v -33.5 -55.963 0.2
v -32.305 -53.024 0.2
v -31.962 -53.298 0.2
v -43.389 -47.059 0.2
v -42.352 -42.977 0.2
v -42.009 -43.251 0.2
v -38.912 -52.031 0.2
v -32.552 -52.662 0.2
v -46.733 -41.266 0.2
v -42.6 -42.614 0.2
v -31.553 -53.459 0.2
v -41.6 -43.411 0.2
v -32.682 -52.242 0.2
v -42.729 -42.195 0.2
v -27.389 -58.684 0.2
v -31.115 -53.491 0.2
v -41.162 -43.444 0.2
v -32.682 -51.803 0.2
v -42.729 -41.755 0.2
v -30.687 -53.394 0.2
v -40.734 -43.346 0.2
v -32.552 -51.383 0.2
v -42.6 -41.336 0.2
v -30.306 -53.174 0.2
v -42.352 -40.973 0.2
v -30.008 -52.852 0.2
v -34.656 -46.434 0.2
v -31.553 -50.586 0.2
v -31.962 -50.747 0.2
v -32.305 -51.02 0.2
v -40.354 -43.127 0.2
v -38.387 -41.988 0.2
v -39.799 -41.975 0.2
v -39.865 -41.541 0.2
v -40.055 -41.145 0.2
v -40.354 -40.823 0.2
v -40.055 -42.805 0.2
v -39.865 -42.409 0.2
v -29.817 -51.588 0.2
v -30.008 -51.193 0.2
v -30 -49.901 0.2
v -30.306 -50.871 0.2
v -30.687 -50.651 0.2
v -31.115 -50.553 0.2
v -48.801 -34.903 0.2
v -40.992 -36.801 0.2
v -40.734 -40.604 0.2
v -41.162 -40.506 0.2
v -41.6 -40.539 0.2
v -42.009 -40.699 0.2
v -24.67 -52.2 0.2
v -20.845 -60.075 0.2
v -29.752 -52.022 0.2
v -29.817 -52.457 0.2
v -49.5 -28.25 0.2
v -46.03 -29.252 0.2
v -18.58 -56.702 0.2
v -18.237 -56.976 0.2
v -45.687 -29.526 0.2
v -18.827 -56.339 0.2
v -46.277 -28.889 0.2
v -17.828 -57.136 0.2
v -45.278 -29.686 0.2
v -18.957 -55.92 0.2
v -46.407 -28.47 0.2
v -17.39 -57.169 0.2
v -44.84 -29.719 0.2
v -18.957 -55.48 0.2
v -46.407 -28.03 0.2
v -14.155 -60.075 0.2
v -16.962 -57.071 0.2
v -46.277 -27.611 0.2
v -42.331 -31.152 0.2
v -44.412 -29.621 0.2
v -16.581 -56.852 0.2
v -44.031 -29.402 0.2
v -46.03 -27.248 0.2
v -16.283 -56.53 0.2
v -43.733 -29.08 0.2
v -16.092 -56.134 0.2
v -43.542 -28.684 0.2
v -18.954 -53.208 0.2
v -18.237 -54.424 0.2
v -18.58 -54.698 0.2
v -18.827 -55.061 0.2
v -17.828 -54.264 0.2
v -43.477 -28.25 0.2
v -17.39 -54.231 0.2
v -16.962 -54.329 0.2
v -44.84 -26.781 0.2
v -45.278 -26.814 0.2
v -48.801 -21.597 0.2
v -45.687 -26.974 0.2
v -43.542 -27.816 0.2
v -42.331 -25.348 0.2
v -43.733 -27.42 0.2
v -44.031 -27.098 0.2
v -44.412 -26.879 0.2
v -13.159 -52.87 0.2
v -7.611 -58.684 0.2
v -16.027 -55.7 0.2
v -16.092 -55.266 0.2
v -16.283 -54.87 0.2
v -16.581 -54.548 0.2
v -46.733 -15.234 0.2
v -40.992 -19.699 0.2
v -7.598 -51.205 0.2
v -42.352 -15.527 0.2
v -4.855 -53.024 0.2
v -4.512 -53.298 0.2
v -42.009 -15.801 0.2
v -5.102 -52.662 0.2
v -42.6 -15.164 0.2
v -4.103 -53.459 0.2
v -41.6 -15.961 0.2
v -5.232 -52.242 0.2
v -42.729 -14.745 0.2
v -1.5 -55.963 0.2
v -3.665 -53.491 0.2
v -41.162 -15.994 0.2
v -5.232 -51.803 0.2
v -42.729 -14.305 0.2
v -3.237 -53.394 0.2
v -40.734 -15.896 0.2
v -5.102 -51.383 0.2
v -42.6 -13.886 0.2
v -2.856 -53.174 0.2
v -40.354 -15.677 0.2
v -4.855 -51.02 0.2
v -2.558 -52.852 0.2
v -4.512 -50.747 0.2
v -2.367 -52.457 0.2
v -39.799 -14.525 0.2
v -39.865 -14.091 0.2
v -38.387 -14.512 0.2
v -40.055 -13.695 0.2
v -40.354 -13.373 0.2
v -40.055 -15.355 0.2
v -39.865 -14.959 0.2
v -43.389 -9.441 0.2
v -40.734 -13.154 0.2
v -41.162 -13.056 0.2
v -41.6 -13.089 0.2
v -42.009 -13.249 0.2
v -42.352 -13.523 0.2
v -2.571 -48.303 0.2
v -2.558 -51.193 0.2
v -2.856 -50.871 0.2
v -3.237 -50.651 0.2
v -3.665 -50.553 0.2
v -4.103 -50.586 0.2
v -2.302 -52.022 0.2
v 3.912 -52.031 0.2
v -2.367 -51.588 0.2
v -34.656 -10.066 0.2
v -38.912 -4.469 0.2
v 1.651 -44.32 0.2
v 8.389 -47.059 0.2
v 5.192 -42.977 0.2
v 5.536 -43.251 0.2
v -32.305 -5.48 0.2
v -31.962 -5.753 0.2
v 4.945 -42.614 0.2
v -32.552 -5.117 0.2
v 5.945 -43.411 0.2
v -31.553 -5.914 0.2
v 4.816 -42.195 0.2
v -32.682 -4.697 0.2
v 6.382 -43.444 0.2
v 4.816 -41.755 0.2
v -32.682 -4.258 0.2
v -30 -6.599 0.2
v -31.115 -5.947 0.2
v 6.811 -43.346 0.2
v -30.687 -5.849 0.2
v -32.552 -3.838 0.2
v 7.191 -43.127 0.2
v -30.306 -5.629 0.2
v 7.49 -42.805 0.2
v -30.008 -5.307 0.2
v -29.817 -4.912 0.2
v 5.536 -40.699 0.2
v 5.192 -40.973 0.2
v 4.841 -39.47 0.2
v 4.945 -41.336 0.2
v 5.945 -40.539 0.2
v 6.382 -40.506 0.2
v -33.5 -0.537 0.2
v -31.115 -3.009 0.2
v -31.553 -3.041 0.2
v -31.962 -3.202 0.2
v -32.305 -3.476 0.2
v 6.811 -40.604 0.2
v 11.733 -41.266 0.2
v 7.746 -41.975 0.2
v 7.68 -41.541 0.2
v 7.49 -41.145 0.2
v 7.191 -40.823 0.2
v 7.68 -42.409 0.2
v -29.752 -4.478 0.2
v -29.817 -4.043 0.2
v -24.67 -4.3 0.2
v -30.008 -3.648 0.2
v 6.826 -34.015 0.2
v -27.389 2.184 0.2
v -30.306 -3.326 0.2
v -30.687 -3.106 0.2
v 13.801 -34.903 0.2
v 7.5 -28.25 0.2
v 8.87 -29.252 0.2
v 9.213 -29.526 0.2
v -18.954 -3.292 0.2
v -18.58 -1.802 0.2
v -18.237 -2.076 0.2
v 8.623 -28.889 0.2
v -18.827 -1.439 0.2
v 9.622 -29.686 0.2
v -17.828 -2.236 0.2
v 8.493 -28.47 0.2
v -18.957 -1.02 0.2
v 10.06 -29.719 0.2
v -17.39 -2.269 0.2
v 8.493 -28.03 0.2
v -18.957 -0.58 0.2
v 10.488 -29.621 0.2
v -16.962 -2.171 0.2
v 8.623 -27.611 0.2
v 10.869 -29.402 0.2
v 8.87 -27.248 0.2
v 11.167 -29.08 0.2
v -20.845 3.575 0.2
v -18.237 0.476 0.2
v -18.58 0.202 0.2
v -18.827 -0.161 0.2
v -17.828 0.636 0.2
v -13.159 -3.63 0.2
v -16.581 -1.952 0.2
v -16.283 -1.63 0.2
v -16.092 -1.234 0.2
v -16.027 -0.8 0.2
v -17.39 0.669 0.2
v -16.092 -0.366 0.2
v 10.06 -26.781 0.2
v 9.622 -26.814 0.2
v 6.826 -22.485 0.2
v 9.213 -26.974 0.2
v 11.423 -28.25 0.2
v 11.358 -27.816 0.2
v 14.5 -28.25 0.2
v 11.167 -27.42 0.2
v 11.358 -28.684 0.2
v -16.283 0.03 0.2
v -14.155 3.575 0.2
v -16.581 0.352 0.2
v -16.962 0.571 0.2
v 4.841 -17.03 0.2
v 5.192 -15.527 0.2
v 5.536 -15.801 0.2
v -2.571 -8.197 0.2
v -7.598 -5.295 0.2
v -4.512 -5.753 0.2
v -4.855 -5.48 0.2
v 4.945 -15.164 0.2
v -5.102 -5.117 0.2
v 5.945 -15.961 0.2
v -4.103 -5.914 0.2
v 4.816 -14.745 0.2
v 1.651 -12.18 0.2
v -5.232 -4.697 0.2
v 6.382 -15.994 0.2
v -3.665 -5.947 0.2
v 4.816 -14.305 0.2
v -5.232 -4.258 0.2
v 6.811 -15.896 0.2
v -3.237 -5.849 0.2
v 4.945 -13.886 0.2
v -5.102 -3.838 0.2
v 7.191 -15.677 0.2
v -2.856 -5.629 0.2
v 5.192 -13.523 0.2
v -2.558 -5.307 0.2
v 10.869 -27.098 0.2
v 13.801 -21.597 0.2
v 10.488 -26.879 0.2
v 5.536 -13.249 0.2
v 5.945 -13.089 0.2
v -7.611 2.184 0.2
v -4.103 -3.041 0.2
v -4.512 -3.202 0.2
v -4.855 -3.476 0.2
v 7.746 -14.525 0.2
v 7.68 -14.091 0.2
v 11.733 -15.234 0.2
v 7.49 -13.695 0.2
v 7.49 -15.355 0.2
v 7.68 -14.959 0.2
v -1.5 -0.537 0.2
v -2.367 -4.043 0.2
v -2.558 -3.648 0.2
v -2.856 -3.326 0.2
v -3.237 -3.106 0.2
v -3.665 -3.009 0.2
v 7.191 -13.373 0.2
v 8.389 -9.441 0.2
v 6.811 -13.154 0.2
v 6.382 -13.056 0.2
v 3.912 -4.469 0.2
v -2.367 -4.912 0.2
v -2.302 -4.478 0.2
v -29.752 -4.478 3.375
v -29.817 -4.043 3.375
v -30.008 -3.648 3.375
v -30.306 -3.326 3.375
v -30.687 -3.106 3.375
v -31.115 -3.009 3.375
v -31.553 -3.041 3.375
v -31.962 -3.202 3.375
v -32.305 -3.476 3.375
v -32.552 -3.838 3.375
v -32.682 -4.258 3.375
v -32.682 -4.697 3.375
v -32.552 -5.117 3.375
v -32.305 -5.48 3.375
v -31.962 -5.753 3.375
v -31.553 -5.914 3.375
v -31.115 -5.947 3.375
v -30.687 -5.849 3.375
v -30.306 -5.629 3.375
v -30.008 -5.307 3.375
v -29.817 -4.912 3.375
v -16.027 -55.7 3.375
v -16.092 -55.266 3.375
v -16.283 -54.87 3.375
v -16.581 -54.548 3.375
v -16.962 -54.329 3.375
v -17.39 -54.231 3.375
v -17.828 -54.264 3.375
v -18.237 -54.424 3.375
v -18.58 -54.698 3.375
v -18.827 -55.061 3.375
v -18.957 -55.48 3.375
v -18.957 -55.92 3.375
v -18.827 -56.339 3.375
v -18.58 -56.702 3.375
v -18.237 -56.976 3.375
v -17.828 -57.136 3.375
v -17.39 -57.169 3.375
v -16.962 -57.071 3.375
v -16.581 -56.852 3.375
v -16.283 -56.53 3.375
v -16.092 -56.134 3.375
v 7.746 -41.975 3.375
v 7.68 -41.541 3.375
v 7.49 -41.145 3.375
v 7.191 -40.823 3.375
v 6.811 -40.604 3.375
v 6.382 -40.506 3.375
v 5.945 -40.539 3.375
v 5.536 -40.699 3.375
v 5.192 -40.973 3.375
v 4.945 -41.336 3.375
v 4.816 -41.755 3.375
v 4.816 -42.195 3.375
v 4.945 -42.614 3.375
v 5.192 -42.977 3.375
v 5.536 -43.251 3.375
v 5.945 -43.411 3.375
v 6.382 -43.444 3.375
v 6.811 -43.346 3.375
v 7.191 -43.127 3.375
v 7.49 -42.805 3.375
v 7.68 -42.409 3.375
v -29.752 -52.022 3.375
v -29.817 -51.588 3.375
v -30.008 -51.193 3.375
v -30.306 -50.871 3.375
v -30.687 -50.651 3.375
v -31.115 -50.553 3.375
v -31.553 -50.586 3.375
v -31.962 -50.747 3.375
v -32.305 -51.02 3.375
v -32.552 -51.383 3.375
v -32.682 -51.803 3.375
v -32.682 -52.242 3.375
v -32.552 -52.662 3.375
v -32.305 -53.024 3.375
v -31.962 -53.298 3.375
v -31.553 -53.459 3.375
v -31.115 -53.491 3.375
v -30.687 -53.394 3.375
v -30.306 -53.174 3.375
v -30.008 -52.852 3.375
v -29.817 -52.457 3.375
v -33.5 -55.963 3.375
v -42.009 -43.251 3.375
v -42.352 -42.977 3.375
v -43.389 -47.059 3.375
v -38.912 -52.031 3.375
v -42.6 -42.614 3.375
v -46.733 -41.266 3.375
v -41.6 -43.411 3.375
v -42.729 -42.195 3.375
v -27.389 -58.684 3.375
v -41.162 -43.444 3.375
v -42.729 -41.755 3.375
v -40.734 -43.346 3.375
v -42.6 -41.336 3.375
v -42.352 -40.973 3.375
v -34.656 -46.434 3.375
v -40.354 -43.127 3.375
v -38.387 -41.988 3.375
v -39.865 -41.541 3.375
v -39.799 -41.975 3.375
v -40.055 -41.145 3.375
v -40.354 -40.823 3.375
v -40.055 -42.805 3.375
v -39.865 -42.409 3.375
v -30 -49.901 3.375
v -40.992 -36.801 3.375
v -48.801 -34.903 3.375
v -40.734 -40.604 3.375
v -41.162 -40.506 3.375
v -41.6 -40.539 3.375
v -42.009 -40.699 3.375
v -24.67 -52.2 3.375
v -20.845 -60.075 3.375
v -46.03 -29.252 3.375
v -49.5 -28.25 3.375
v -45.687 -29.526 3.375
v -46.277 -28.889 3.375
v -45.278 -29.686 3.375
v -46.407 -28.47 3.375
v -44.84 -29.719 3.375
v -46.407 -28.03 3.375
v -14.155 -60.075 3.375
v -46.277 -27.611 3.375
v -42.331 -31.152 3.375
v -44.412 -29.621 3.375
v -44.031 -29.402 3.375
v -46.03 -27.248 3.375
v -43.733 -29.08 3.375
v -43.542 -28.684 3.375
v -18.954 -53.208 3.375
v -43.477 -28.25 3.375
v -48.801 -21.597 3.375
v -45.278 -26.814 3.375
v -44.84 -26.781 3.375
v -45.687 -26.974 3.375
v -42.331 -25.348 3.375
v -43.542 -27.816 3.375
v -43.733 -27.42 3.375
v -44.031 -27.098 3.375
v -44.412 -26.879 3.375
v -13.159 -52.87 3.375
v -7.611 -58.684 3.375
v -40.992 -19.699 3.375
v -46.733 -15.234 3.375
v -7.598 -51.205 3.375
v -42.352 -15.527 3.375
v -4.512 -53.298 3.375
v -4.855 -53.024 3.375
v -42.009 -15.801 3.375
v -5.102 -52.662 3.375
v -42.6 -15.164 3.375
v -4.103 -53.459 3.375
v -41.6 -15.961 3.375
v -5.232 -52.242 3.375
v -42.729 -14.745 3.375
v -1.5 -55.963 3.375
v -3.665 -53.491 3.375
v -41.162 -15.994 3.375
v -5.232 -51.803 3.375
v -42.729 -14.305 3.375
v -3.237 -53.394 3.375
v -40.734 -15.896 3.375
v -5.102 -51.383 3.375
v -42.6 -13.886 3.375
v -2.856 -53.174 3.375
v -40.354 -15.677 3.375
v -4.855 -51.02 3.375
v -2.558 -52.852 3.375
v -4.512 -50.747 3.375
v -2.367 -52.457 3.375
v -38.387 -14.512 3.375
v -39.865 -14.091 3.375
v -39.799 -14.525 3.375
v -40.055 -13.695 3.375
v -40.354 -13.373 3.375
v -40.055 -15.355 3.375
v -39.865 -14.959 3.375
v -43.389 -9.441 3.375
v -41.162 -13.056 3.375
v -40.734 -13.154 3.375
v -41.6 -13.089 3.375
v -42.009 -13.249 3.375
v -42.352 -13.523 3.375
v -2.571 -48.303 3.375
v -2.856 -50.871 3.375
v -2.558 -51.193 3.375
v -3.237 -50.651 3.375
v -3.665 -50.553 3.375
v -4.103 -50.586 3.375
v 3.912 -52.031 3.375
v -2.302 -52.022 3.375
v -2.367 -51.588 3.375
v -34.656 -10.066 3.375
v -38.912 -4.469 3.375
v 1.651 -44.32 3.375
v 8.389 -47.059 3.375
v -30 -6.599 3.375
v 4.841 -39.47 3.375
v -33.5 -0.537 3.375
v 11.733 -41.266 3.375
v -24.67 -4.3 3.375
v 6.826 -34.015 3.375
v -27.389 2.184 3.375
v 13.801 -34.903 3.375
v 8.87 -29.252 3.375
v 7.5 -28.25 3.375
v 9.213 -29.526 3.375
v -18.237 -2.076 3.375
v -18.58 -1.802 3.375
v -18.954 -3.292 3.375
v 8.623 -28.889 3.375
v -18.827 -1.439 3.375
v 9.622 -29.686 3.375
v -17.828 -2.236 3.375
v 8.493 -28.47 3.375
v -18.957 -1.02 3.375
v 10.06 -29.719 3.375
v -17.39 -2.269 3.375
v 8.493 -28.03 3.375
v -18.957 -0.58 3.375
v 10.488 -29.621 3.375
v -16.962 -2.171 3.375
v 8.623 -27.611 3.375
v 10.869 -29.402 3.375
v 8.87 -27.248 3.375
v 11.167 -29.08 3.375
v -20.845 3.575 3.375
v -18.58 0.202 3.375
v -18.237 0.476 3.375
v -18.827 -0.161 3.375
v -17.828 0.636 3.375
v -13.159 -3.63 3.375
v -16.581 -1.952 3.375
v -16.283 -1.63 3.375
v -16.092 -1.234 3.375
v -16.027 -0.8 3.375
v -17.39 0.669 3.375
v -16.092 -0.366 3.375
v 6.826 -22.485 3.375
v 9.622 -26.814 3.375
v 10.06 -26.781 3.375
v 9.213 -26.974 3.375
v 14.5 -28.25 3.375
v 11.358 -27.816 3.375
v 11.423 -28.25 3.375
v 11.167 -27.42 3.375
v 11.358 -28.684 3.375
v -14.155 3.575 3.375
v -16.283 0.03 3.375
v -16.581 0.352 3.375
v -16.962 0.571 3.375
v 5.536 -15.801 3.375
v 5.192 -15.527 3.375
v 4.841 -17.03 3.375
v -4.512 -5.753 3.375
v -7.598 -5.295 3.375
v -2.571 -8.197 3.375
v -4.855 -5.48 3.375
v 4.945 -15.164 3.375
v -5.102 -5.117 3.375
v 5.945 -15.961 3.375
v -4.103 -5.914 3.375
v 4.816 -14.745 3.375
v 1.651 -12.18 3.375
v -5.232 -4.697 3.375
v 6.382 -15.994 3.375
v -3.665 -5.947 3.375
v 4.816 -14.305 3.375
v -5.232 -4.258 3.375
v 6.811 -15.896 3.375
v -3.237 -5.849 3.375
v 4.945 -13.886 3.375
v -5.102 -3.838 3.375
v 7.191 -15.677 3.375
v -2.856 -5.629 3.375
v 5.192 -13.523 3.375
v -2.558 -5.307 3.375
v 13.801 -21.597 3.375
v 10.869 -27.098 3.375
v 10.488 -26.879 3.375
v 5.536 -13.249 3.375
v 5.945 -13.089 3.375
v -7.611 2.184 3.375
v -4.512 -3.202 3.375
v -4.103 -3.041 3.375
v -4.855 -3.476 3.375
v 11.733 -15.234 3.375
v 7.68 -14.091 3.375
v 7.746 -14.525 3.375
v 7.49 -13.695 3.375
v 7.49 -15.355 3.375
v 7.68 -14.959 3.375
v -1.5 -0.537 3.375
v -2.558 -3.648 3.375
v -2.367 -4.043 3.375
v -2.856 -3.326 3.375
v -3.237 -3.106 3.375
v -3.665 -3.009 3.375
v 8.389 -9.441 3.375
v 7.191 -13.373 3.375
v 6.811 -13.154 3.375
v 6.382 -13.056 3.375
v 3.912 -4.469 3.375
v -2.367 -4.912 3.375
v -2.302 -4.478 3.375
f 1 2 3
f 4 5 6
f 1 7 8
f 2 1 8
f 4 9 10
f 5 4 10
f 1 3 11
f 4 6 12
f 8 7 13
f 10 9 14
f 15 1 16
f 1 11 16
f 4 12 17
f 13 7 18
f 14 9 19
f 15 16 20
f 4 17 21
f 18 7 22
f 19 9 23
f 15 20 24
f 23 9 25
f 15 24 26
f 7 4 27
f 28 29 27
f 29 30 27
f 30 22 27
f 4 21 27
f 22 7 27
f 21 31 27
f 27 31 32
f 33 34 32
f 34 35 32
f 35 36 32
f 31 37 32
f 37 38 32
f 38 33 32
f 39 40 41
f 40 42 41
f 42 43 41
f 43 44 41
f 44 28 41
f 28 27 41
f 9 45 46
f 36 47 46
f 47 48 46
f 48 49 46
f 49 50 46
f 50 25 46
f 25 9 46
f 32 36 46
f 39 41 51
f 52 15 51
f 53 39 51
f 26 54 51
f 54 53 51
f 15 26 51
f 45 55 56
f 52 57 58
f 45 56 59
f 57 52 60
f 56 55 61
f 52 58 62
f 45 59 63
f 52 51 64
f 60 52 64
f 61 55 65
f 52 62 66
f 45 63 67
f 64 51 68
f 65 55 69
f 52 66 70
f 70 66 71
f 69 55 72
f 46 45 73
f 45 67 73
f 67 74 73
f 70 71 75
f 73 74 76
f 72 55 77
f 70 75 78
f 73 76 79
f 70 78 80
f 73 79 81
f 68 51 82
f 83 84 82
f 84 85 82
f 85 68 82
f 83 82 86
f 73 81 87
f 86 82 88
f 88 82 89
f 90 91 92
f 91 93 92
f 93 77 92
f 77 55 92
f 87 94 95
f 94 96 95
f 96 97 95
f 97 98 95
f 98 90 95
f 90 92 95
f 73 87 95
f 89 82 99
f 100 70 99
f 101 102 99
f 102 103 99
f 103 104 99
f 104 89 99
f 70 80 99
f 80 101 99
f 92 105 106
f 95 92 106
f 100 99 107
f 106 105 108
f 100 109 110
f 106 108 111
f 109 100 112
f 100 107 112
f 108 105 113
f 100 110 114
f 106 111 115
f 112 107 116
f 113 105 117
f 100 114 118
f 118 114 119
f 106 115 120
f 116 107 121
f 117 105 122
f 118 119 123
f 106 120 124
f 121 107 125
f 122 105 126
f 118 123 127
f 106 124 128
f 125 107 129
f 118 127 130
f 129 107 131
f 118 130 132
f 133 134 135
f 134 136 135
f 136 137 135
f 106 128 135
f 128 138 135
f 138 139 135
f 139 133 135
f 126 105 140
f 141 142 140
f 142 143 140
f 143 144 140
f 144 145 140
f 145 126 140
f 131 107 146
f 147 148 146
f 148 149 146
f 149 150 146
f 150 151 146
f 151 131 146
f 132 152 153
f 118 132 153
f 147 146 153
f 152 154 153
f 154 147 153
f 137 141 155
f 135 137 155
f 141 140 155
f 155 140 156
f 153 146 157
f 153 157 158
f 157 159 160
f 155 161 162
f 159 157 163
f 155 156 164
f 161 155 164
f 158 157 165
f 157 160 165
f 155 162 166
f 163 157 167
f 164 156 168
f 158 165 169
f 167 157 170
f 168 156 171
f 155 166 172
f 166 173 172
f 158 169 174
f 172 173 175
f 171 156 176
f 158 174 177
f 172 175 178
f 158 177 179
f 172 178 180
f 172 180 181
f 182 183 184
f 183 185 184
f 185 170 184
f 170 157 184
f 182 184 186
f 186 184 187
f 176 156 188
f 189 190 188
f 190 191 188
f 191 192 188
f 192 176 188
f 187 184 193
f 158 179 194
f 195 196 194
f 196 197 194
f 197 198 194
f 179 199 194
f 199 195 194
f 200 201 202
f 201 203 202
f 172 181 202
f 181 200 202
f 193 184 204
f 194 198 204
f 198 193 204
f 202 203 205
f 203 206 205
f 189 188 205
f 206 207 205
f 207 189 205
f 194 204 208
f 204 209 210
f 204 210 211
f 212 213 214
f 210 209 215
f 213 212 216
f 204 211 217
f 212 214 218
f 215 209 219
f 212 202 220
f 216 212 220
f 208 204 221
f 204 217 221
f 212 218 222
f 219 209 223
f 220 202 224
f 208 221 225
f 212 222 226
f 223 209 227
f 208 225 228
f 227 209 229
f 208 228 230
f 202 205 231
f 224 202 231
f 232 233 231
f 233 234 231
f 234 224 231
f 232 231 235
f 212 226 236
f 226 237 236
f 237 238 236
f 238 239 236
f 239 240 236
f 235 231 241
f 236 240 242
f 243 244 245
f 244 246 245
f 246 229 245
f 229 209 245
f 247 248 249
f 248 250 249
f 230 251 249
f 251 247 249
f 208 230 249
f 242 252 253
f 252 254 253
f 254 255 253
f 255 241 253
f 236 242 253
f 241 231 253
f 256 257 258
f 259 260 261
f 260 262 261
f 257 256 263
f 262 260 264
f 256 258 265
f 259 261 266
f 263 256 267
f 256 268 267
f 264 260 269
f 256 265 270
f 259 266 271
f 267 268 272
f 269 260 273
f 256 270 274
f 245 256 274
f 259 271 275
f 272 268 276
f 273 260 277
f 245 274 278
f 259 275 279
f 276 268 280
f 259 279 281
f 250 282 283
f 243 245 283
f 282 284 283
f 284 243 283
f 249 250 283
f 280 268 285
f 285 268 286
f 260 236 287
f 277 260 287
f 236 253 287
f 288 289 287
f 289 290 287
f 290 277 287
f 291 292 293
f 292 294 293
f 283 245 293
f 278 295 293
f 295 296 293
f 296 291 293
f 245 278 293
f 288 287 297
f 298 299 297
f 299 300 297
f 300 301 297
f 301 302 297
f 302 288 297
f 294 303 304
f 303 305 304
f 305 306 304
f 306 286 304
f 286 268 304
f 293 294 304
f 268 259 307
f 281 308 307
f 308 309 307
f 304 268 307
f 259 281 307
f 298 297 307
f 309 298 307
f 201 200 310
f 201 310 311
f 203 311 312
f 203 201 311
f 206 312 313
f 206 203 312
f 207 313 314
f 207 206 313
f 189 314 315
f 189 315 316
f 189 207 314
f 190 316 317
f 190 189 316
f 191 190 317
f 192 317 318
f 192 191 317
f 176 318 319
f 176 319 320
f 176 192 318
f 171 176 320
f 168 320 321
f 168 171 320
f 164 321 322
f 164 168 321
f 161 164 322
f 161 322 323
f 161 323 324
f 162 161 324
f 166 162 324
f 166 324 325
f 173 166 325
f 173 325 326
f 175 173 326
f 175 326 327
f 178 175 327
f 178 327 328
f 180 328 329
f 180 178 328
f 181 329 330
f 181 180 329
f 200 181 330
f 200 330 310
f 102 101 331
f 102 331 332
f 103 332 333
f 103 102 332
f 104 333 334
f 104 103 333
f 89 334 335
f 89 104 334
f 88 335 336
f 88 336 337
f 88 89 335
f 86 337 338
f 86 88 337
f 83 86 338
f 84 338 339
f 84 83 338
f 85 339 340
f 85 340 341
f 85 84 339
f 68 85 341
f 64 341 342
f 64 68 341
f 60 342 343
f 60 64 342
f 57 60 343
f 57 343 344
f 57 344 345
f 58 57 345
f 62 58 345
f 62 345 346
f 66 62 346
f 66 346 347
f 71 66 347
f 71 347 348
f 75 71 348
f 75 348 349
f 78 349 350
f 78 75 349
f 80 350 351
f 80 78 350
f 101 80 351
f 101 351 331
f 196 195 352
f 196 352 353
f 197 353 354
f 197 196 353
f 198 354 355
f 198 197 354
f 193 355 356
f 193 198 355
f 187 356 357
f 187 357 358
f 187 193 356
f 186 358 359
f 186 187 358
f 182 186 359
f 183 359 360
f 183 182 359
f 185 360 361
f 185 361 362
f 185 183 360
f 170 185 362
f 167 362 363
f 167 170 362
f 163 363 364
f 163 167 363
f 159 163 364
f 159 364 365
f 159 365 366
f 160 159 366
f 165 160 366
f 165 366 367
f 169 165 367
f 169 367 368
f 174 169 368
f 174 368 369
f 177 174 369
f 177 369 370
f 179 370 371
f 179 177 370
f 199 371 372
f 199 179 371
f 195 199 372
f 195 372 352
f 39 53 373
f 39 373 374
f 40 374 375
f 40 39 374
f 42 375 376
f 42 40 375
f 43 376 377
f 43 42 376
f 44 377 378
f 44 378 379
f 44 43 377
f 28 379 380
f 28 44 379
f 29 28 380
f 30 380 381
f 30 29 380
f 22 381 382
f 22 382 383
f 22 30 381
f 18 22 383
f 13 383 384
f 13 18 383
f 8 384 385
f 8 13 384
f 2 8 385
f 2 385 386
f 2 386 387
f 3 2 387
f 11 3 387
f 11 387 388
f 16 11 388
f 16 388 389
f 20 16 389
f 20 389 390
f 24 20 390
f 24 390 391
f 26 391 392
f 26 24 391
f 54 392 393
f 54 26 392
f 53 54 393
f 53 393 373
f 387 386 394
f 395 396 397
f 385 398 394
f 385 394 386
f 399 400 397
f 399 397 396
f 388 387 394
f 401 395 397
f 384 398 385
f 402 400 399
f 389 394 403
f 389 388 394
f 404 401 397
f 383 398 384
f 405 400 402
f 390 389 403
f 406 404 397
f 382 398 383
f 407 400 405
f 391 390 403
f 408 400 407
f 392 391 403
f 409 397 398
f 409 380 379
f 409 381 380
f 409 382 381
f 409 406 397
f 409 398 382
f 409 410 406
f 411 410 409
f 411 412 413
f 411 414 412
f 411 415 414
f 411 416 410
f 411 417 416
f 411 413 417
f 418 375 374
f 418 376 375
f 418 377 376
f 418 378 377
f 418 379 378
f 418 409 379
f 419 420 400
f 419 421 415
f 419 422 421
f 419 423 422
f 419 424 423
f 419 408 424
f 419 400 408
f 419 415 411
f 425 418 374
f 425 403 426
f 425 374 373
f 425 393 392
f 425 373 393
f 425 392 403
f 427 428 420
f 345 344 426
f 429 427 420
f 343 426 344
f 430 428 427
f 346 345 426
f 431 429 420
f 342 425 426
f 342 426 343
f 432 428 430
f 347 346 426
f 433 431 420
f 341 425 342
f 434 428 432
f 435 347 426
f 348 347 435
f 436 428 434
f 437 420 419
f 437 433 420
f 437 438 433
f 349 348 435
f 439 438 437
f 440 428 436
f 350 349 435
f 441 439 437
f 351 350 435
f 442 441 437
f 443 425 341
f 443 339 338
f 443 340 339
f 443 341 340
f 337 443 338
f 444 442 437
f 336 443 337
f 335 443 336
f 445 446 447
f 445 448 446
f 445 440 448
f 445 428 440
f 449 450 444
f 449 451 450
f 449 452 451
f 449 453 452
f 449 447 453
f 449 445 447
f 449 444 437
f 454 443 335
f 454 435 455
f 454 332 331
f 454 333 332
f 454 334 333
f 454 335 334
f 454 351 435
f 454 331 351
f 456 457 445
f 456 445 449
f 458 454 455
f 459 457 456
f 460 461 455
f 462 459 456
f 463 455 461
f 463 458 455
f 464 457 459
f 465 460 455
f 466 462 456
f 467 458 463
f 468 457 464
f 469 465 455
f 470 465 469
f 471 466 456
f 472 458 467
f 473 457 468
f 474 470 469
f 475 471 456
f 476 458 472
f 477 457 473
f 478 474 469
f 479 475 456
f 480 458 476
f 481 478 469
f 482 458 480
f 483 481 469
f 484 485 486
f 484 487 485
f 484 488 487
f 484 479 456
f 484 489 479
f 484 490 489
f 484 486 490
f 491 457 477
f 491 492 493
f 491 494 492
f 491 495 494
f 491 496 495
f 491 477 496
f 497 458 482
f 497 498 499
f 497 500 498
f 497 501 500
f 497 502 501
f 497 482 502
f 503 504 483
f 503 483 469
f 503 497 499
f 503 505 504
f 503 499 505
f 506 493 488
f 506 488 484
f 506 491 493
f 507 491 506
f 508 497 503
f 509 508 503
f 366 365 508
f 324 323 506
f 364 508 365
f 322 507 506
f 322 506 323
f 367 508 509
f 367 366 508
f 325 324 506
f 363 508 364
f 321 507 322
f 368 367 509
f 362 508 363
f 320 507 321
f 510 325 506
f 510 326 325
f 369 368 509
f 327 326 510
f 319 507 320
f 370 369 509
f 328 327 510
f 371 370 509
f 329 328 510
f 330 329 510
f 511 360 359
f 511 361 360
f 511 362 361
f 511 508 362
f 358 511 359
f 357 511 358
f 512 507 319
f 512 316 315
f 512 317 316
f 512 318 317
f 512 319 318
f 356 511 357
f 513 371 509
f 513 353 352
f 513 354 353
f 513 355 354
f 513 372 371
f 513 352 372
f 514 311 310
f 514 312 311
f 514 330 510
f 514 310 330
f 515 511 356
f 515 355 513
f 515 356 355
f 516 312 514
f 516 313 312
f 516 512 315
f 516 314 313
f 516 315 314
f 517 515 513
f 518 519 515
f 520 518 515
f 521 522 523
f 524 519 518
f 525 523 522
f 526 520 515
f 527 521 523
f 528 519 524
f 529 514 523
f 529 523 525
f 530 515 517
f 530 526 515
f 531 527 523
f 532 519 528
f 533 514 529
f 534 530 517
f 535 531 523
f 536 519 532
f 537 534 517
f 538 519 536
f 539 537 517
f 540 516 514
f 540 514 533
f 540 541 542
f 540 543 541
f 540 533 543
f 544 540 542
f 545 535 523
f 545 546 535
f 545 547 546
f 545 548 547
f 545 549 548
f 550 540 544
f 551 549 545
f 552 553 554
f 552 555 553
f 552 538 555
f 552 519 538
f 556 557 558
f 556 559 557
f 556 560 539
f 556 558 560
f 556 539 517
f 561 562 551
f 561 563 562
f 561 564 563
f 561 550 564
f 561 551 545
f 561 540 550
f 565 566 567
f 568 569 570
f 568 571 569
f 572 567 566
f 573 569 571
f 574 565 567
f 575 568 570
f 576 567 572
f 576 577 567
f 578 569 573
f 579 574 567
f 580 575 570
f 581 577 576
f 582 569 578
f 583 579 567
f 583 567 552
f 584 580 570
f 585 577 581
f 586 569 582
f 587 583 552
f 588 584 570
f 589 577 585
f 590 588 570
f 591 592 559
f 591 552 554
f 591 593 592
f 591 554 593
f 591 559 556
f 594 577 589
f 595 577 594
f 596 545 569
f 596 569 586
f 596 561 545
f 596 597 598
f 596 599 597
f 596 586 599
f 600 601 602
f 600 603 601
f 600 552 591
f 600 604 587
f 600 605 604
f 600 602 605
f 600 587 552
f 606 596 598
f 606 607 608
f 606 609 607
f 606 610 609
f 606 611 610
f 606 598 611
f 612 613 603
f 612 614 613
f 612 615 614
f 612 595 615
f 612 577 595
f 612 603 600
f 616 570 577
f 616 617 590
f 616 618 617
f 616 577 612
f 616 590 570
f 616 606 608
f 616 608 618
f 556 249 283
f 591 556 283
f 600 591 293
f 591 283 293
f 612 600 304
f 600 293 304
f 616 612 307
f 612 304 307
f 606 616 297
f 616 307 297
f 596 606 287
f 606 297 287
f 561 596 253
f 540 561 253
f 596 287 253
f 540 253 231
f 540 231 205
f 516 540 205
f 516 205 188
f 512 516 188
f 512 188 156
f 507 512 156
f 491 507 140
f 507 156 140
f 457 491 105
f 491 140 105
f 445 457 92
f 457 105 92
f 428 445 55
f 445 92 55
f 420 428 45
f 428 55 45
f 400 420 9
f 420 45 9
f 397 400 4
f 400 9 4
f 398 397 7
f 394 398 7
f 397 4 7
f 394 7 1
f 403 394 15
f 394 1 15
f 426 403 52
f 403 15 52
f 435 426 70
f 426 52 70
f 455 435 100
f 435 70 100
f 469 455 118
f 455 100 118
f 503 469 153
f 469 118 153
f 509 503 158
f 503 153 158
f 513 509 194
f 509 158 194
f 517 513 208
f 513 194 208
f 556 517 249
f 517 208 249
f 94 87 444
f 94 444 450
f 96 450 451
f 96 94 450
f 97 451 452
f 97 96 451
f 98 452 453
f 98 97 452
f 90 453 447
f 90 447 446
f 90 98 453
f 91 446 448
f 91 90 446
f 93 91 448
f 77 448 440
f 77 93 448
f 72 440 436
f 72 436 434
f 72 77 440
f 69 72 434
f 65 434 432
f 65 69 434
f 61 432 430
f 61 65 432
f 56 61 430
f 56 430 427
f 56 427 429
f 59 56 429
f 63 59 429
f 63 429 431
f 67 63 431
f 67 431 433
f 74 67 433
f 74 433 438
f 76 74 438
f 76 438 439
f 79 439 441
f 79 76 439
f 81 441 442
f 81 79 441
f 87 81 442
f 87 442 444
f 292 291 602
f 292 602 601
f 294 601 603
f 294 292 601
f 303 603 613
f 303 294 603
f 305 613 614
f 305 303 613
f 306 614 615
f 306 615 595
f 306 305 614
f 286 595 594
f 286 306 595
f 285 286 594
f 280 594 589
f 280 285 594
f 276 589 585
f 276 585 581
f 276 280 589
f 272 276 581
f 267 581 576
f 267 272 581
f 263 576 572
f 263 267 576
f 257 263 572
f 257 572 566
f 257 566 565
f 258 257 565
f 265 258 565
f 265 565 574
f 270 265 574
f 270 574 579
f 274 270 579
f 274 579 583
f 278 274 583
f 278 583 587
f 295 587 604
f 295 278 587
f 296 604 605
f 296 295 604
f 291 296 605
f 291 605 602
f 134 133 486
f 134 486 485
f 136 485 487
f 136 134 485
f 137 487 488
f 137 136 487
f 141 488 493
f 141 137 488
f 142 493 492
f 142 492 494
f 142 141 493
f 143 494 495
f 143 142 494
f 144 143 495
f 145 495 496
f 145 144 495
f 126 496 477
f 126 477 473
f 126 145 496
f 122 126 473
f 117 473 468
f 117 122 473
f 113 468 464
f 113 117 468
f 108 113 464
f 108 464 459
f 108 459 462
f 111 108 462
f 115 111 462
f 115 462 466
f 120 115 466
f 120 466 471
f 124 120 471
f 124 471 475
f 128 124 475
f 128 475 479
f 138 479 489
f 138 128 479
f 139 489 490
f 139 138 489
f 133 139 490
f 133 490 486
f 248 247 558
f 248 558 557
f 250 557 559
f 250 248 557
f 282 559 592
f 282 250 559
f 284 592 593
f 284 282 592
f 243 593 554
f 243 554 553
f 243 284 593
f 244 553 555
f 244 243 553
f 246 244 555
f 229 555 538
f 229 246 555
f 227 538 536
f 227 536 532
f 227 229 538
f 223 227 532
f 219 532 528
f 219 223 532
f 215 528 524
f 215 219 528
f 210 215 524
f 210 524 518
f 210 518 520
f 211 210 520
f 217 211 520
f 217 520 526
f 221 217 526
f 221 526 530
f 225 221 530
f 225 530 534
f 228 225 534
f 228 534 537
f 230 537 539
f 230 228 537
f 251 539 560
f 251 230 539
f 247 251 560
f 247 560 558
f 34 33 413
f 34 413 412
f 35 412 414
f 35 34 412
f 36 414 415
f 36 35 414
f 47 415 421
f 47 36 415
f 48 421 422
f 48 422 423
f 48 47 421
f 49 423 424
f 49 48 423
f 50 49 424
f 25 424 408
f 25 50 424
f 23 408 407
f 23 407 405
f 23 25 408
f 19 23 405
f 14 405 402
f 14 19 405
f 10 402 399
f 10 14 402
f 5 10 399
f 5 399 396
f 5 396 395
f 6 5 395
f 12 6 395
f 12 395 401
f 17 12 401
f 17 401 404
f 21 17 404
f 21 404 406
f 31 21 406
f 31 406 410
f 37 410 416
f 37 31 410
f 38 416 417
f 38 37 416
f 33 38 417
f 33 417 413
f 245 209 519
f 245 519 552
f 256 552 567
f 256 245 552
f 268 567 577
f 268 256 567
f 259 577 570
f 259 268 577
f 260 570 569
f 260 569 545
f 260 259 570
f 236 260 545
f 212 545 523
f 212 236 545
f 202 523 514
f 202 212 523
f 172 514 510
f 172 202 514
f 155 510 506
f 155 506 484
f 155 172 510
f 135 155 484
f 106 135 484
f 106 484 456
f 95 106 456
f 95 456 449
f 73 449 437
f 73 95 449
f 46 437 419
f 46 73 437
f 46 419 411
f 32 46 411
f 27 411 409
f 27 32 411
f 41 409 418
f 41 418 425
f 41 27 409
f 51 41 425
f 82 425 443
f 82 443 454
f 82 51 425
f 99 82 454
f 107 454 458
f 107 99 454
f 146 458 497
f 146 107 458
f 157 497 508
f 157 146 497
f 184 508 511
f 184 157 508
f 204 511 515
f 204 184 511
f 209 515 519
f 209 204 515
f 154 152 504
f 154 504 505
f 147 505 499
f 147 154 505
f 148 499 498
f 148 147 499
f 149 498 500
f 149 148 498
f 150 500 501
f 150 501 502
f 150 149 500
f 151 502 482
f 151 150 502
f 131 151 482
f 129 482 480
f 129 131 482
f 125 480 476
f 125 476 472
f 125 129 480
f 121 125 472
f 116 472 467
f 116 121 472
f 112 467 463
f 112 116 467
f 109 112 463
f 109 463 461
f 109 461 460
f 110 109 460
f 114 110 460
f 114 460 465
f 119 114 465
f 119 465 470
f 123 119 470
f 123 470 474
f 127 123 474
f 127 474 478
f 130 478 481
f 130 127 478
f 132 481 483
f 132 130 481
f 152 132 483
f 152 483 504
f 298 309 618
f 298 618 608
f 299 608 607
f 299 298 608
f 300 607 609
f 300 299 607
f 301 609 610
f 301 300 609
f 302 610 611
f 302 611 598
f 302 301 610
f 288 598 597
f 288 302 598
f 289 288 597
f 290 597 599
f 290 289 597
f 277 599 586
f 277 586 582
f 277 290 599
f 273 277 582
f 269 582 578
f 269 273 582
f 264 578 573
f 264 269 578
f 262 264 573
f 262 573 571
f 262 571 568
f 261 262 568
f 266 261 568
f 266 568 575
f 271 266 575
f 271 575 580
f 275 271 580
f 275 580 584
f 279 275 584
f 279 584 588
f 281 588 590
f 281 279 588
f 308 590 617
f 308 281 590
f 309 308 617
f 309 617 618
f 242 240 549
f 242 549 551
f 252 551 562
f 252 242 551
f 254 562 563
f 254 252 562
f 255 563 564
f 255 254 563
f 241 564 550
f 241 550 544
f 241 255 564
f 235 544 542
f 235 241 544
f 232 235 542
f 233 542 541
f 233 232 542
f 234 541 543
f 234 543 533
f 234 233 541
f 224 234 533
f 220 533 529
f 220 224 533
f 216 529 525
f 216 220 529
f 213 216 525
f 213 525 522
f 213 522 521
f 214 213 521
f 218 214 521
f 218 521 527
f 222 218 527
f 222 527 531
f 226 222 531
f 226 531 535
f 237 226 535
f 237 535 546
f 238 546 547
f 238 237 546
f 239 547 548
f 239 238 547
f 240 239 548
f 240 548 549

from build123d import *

# Parameters (mm, degrees)
SKETCH1_R           = 32
SKETCH1_R_2         = 25
SKETCH1_R_3         = 1.4732
BOSS_EXTRUDE1_DEPTH = 3.175


with BuildPart() as part:
    # Sketch1 → Boss-Extrude1 (new body)
    with BuildSketch(Plane.XY.offset(0.2)):
        with Locations((-17.5, -28.25)):
            Circle(SKETCH1_R)
        with Locations((-17.5, -28.25)):
            Circle(SKETCH1_R_2, mode=Mode.SUBTRACT)
        with Locations((-17.5, -55.7)):
            Circle(SKETCH1_R_3, mode=Mode.SUBTRACT)
        with Locations((-31.225, -52.022397334)):
            Circle(SKETCH1_R_3, mode=Mode.SUBTRACT)
        with Locations((-41.272397334, -41.975)):
            Circle(SKETCH1_R_3, mode=Mode.SUBTRACT)
        with Locations((-44.95, -28.25)):
            Circle(SKETCH1_R_3, mode=Mode.SUBTRACT)
        with Locations((-41.272397334, -14.525)):
            Circle(SKETCH1_R_3, mode=Mode.SUBTRACT)
        with Locations((-31.225, -4.477602666)):
            Circle(SKETCH1_R_3, mode=Mode.SUBTRACT)
        with Locations((-17.5, -0.8)):
            Circle(SKETCH1_R_3, mode=Mode.SUBTRACT)
        with Locations((-3.775, -4.477602666)):
            Circle(SKETCH1_R_3, mode=Mode.SUBTRACT)
        with Locations((6.272397334, -14.525)):
            Circle(SKETCH1_R_3, mode=Mode.SUBTRACT)
        with Locations((9.95, -28.25)):
            Circle(SKETCH1_R_3, mode=Mode.SUBTRACT)
        with Locations((6.272397334, -41.975)):
            Circle(SKETCH1_R_3, mode=Mode.SUBTRACT)
        with Locations((-3.775, -52.022397334)):
            Circle(SKETCH1_R_3, mode=Mode.SUBTRACT)
    extrude(amount=BOSS_EXTRUDE1_DEPTH)


solid = part.part
